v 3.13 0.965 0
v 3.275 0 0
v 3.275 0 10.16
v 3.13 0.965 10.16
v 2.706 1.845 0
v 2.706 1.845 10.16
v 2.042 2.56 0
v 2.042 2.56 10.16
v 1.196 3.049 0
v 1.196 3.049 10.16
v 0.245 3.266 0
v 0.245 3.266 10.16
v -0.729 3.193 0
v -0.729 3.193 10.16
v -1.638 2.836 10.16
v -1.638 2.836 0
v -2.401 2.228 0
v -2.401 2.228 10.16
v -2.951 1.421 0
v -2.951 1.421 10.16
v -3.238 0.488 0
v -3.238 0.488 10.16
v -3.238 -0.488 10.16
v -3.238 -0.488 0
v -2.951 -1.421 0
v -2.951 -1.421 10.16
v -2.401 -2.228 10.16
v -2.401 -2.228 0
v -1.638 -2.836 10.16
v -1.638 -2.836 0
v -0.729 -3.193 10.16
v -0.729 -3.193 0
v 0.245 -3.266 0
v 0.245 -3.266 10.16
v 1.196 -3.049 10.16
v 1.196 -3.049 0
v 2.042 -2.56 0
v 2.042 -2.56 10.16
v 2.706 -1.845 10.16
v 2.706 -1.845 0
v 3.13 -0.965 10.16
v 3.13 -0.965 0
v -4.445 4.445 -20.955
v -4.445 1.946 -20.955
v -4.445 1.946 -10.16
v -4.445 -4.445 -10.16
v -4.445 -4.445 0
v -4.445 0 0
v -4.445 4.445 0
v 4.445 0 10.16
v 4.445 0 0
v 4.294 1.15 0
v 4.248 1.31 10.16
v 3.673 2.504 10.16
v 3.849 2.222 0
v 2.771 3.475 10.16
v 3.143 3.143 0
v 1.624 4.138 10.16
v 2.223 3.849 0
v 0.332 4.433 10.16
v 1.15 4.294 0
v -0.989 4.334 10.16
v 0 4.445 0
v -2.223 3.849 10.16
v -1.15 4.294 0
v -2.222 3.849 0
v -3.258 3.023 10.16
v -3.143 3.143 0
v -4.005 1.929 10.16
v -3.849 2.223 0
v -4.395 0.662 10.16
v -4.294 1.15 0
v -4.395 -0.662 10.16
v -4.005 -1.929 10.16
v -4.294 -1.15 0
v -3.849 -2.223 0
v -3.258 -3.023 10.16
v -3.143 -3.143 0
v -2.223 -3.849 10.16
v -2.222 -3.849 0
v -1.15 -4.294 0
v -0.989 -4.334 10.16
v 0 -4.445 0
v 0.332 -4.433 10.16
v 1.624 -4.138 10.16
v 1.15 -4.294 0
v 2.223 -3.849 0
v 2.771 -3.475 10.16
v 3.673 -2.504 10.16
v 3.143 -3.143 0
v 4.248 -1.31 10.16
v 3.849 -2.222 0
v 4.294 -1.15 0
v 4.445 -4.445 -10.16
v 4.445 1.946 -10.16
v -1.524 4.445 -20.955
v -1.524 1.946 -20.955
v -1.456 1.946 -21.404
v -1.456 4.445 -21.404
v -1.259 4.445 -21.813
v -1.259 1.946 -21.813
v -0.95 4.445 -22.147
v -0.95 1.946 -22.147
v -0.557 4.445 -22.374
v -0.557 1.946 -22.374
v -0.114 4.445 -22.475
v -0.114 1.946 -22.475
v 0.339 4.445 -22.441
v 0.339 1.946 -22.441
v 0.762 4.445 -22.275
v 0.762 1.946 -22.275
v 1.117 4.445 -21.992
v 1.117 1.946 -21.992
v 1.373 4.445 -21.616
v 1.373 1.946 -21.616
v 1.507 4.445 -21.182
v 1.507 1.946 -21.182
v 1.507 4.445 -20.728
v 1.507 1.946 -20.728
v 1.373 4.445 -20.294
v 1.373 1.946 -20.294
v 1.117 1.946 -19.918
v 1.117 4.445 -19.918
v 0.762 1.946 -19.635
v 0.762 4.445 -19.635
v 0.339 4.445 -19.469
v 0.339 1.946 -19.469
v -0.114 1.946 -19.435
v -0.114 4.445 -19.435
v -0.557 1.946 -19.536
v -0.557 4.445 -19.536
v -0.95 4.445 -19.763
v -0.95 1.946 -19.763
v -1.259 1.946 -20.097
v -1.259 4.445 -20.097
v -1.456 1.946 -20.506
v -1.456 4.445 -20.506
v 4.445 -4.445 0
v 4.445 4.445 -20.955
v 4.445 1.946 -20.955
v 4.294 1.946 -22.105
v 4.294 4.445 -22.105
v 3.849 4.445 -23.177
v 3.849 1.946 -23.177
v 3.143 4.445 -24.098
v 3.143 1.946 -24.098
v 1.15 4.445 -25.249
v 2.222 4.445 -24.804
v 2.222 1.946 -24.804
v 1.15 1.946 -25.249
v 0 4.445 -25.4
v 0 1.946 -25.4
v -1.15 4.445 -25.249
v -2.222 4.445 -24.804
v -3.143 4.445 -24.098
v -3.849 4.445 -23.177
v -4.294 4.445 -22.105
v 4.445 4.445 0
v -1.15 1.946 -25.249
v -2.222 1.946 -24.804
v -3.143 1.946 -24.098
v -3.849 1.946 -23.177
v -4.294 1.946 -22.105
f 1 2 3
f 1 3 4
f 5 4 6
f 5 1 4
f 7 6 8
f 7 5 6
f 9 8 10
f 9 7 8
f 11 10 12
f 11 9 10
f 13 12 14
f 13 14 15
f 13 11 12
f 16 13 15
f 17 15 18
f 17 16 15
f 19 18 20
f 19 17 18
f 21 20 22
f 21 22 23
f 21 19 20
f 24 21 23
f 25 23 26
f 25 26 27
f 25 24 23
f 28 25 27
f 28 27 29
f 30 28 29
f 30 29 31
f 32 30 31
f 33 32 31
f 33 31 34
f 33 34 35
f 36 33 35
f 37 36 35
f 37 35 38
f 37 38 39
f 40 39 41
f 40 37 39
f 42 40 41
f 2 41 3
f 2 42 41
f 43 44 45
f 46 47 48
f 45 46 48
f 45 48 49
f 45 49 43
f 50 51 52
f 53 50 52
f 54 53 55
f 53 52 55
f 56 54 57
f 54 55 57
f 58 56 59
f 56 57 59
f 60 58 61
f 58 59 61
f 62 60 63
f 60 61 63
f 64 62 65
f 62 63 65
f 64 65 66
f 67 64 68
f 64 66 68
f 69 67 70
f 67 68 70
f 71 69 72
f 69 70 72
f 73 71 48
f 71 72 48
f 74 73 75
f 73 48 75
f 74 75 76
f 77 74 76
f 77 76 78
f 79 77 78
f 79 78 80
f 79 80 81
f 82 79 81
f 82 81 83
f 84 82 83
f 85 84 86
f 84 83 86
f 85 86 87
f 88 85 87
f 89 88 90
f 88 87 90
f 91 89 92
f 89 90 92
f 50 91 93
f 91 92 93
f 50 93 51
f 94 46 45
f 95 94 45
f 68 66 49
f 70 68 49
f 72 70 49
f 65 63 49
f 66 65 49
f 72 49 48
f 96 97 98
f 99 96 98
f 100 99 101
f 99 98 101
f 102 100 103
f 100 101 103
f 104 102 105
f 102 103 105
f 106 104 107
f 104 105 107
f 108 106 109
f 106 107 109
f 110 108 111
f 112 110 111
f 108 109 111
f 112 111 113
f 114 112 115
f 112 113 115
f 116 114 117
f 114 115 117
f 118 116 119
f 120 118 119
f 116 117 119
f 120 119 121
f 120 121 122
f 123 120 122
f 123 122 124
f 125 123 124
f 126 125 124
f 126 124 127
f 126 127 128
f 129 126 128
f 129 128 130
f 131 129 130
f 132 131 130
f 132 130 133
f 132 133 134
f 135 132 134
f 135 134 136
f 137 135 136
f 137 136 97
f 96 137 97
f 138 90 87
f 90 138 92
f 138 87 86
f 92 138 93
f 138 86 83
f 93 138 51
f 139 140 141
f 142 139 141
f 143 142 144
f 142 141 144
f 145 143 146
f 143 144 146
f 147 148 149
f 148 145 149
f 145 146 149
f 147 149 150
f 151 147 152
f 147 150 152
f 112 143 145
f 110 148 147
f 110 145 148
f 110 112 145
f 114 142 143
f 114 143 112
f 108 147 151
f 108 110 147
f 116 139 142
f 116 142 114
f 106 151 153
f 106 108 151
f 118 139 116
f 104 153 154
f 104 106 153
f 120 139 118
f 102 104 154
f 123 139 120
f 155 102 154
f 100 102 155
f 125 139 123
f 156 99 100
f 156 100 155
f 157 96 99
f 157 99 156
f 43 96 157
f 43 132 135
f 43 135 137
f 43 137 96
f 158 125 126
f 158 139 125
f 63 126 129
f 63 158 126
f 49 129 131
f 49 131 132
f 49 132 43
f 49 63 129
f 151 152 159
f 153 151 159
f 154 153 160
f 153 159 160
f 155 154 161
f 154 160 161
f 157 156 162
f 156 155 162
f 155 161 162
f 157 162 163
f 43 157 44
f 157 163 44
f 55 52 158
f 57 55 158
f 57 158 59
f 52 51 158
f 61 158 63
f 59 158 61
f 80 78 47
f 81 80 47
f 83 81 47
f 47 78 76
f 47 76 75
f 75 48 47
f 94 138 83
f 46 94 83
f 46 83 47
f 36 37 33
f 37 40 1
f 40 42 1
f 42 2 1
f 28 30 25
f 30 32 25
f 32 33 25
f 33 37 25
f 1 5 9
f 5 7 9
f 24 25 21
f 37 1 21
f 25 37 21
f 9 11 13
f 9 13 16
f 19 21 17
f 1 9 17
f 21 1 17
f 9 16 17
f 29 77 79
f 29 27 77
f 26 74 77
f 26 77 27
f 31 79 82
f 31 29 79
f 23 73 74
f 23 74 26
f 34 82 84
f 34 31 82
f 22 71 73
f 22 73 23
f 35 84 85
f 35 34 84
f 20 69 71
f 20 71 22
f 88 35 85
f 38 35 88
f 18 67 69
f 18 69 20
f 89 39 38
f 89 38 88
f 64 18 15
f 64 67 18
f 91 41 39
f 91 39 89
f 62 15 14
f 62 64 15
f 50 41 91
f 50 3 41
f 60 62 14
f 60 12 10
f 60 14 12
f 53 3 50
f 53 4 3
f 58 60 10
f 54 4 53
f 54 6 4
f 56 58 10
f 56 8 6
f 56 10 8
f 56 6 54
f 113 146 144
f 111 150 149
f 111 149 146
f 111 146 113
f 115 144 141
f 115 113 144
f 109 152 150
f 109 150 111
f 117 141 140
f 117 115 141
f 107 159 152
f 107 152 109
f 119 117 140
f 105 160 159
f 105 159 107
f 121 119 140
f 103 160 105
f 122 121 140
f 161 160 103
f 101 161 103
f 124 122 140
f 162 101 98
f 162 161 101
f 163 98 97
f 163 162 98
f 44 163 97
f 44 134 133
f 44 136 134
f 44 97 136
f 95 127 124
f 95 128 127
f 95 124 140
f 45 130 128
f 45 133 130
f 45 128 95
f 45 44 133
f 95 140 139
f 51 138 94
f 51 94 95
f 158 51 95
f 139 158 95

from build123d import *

# Parameters (mm, degrees)
SKETCH1_R           = 4.445
SKETCH1_R_2         = 3.275000003
BOSS_EXTRUDE1_DEPTH = 10.16
SKETCH2_W           = 8.89
SKETCH2_H           = 8.89
BOSS_EXTRUDE2_DEPTH = 25.4
CUT_EXTRUDE1_DEPTH  = 28.275449126
SKETCH4_W           = 15.24
SKETCH4_H           = 6.39064
CUT_EXTRUDE2_DEPTH  = 28.275449126


with BuildPart() as part:
    # Sketch1 → Boss-Extrude1 (new body)
    with BuildSketch(Plane.XY):
        Circle(SKETCH1_R)
        Circle(SKETCH1_R_2, mode=Mode.SUBTRACT)
    extrude(amount=BOSS_EXTRUDE1_DEPTH)

    # Sketch2 → Boss-Extrude2 (add)
    with BuildSketch(Plane(origin=(0, 0, 0), x_dir=(-1, 0, 0), z_dir=(0, 0, -1))):
        Rectangle(SKETCH2_W, SKETCH2_H)
    extrude(amount=BOSS_EXTRUDE2_DEPTH)

    # Sketch3 → Cut-Extrude1 (cut, through all)
    with BuildSketch(Plane.XZ.offset(4.445)):
        with BuildLine():
            Line((4.445, -25.4), (4.445, -20.955))
            ThreePointArc((4.445, -20.955), (3.143089642, -24.098089642), (0, -25.4))
            Line((0, -25.4), (4.445, -25.4))
        make_face()
        with BuildLine():
            ThreePointArc((0, -25.4), (-3.143089642, -24.098089642), (-4.445, -20.955))
            Line((-4.445, -20.955), (-4.445, -25.4))
            Line((-4.445, -25.4), (0, -25.4))
        make_face()
        with BuildLine():
            ThreePointArc((1.524, -20.955), (0, -19.431), (-1.524, -20.955))
            Line((-1.524, -20.955), (1.524, -20.955))
        make_face()
        with BuildLine():
            Line((1.524, -20.955), (-1.524, -20.955))
            ThreePointArc((-1.524, -20.955), (0, -22.479), (1.524, -20.955))
        make_face()
    extrude(amount=-CUT_EXTRUDE1_DEPTH, mode=Mode.SUBTRACT)

    # Sketch4 → Cut-Extrude2 (cut, through all)
    with BuildSketch(Plane.ZY.offset(4.445)):
        with Locations((-17.78, -1.24968)):
            Rectangle(SKETCH4_W, SKETCH4_H)
    extrude(amount=-CUT_EXTRUDE2_DEPTH, mode=Mode.SUBTRACT)


solid = part.part
